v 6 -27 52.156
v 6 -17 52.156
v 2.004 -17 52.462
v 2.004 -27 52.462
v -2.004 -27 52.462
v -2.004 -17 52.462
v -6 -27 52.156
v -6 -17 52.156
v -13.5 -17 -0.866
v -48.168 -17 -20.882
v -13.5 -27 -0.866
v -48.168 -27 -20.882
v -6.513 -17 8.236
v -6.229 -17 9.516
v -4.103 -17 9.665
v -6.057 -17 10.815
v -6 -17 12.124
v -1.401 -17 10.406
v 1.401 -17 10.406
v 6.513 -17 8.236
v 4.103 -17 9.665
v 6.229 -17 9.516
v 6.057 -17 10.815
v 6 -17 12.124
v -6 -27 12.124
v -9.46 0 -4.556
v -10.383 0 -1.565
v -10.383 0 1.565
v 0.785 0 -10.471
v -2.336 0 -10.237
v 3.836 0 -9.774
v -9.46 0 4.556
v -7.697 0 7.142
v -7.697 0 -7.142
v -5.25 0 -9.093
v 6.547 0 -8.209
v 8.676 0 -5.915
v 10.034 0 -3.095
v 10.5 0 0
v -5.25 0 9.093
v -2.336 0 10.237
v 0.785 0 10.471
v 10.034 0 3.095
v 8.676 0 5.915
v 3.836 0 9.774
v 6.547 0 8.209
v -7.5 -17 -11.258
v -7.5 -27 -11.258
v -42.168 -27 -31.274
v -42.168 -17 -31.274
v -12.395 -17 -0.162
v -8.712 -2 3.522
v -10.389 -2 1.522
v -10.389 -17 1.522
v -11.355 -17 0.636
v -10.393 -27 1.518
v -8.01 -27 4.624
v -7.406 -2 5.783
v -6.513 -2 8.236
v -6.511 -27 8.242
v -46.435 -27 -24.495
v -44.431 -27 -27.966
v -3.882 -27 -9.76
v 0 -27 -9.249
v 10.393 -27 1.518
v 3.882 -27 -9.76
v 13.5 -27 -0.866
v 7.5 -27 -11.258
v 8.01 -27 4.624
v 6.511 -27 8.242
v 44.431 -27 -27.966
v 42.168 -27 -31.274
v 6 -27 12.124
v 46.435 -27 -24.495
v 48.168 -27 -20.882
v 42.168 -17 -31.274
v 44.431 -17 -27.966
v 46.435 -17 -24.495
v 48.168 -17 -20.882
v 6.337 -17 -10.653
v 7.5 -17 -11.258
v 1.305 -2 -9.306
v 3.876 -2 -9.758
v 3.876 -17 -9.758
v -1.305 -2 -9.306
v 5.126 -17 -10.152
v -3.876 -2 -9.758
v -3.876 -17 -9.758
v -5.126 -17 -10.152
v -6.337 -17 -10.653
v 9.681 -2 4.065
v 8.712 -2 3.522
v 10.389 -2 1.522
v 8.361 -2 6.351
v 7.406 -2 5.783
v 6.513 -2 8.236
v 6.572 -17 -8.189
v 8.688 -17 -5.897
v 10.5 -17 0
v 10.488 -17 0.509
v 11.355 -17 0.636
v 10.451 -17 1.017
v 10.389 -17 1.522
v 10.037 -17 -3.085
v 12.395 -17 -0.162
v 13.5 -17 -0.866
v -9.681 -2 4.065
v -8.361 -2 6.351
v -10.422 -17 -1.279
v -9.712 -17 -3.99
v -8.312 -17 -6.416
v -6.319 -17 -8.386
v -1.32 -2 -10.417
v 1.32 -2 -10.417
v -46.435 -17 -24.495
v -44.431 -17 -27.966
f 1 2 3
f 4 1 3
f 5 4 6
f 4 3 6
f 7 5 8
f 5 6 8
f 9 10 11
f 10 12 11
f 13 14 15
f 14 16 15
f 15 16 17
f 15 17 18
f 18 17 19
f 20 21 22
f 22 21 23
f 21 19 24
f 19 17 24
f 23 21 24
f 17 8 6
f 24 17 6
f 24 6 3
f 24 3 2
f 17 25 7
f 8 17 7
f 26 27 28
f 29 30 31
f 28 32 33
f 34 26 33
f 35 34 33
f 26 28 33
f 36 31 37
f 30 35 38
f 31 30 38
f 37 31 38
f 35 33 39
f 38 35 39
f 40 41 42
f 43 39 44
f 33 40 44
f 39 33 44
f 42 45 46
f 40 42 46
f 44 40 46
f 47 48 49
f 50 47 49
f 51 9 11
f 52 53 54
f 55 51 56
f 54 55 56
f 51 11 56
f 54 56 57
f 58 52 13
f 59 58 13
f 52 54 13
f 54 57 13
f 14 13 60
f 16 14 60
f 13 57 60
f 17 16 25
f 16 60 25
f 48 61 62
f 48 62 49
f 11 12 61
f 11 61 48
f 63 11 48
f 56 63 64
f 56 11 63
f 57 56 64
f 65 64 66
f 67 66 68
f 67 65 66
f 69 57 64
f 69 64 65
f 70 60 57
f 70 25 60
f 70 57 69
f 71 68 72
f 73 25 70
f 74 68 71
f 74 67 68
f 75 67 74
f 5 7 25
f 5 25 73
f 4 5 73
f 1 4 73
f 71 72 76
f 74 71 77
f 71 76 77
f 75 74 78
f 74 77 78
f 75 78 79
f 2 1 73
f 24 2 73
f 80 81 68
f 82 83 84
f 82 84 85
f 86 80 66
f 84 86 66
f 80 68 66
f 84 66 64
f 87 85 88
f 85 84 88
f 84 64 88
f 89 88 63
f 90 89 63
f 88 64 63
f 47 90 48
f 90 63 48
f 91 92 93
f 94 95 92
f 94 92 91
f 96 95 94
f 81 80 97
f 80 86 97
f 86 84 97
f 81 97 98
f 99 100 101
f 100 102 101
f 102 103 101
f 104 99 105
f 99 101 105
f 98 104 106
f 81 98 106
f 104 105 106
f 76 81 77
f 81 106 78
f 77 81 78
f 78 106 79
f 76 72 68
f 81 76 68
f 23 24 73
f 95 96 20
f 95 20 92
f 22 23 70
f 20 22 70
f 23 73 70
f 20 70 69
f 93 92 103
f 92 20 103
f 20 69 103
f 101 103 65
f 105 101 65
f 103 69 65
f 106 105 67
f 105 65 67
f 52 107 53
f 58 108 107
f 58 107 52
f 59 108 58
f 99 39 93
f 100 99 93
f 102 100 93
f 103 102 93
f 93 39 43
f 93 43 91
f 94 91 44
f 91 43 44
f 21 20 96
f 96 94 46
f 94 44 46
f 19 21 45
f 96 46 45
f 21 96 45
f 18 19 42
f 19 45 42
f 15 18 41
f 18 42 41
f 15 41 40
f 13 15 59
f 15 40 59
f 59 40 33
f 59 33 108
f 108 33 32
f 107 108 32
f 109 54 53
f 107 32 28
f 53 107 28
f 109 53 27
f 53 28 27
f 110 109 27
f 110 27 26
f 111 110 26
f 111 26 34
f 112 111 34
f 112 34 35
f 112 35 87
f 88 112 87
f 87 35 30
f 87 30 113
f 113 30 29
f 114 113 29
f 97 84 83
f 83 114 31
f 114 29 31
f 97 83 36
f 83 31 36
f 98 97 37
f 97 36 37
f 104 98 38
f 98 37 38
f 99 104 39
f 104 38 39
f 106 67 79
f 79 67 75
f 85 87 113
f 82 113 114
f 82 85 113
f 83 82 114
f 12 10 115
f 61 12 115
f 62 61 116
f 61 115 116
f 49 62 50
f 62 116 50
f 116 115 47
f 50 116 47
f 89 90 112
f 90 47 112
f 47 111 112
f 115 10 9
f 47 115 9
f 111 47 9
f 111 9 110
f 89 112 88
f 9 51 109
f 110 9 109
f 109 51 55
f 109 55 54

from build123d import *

# Parameters (mm, degrees)
F0_R     = 10.5
F1_DEPTH = 17
F2_R     = 52.5
F3_DEPTH = 10
F5_DEPTH = 25


with BuildPart() as f1:
    # F0 (on Front) → F1 (new body)
    with BuildSketch(Plane.XZ):
        Circle(F0_R)
    extrude(amount=F1_DEPTH)

    # F2 (on face) → F3 (join)
    with BuildSketch(Plane.XZ.offset(17)):
        Circle(F2_R)
    extrude(amount=F3_DEPTH)

    # F4 (on face) → F5 (cut)
    with BuildSketch(Plane.XZ.offset(27)):
        with BuildLine():
            ThreePointArc((-13.5, -0.866025), (-8.009619, 4.624356), (-6, 12.124356))
            Line((-6, 12.124356), (-6, 52.156016))
            ThreePointArc((-6, 52.156016), (-45.466334, 26.25), (-48.168435, -20.881856))
            Line((-48.168435, -20.881856), (-13.5, -0.866025))
        make_face()
        with BuildLine():
            ThreePointArc((52.5, 0), (39.187051, 34.937444), (6, 52.156016))
            Line((6, 52.156016), (6, 12.124356))
            ThreePointArc((6, 12.124356), (8.009619, 4.624356), (13.5, -0.866025))
            Line((13.5, -0.866025), (48.168435, -20.881856))
            ThreePointArc((48.168435, -20.881856), (51.405704, -10.663188), (52.5, 0))
        make_face()
        with BuildLine():
            Line((-7.5, -11.25833), (-42.168435, -31.27416))
            ThreePointArc((-42.168435, -31.27416), (0, -52.5), (42.168435, -31.27416))
            Line((42.168435, -31.27416), (7.5, -11.25833))
            ThreePointArc((7.5, -11.25833), (0, -9.248711), (-7.5, -11.25833))
        make_face()
    extrude(amount=-F5_DEPTH, mode=Mode.SUBTRACT)


solid = f1.part
